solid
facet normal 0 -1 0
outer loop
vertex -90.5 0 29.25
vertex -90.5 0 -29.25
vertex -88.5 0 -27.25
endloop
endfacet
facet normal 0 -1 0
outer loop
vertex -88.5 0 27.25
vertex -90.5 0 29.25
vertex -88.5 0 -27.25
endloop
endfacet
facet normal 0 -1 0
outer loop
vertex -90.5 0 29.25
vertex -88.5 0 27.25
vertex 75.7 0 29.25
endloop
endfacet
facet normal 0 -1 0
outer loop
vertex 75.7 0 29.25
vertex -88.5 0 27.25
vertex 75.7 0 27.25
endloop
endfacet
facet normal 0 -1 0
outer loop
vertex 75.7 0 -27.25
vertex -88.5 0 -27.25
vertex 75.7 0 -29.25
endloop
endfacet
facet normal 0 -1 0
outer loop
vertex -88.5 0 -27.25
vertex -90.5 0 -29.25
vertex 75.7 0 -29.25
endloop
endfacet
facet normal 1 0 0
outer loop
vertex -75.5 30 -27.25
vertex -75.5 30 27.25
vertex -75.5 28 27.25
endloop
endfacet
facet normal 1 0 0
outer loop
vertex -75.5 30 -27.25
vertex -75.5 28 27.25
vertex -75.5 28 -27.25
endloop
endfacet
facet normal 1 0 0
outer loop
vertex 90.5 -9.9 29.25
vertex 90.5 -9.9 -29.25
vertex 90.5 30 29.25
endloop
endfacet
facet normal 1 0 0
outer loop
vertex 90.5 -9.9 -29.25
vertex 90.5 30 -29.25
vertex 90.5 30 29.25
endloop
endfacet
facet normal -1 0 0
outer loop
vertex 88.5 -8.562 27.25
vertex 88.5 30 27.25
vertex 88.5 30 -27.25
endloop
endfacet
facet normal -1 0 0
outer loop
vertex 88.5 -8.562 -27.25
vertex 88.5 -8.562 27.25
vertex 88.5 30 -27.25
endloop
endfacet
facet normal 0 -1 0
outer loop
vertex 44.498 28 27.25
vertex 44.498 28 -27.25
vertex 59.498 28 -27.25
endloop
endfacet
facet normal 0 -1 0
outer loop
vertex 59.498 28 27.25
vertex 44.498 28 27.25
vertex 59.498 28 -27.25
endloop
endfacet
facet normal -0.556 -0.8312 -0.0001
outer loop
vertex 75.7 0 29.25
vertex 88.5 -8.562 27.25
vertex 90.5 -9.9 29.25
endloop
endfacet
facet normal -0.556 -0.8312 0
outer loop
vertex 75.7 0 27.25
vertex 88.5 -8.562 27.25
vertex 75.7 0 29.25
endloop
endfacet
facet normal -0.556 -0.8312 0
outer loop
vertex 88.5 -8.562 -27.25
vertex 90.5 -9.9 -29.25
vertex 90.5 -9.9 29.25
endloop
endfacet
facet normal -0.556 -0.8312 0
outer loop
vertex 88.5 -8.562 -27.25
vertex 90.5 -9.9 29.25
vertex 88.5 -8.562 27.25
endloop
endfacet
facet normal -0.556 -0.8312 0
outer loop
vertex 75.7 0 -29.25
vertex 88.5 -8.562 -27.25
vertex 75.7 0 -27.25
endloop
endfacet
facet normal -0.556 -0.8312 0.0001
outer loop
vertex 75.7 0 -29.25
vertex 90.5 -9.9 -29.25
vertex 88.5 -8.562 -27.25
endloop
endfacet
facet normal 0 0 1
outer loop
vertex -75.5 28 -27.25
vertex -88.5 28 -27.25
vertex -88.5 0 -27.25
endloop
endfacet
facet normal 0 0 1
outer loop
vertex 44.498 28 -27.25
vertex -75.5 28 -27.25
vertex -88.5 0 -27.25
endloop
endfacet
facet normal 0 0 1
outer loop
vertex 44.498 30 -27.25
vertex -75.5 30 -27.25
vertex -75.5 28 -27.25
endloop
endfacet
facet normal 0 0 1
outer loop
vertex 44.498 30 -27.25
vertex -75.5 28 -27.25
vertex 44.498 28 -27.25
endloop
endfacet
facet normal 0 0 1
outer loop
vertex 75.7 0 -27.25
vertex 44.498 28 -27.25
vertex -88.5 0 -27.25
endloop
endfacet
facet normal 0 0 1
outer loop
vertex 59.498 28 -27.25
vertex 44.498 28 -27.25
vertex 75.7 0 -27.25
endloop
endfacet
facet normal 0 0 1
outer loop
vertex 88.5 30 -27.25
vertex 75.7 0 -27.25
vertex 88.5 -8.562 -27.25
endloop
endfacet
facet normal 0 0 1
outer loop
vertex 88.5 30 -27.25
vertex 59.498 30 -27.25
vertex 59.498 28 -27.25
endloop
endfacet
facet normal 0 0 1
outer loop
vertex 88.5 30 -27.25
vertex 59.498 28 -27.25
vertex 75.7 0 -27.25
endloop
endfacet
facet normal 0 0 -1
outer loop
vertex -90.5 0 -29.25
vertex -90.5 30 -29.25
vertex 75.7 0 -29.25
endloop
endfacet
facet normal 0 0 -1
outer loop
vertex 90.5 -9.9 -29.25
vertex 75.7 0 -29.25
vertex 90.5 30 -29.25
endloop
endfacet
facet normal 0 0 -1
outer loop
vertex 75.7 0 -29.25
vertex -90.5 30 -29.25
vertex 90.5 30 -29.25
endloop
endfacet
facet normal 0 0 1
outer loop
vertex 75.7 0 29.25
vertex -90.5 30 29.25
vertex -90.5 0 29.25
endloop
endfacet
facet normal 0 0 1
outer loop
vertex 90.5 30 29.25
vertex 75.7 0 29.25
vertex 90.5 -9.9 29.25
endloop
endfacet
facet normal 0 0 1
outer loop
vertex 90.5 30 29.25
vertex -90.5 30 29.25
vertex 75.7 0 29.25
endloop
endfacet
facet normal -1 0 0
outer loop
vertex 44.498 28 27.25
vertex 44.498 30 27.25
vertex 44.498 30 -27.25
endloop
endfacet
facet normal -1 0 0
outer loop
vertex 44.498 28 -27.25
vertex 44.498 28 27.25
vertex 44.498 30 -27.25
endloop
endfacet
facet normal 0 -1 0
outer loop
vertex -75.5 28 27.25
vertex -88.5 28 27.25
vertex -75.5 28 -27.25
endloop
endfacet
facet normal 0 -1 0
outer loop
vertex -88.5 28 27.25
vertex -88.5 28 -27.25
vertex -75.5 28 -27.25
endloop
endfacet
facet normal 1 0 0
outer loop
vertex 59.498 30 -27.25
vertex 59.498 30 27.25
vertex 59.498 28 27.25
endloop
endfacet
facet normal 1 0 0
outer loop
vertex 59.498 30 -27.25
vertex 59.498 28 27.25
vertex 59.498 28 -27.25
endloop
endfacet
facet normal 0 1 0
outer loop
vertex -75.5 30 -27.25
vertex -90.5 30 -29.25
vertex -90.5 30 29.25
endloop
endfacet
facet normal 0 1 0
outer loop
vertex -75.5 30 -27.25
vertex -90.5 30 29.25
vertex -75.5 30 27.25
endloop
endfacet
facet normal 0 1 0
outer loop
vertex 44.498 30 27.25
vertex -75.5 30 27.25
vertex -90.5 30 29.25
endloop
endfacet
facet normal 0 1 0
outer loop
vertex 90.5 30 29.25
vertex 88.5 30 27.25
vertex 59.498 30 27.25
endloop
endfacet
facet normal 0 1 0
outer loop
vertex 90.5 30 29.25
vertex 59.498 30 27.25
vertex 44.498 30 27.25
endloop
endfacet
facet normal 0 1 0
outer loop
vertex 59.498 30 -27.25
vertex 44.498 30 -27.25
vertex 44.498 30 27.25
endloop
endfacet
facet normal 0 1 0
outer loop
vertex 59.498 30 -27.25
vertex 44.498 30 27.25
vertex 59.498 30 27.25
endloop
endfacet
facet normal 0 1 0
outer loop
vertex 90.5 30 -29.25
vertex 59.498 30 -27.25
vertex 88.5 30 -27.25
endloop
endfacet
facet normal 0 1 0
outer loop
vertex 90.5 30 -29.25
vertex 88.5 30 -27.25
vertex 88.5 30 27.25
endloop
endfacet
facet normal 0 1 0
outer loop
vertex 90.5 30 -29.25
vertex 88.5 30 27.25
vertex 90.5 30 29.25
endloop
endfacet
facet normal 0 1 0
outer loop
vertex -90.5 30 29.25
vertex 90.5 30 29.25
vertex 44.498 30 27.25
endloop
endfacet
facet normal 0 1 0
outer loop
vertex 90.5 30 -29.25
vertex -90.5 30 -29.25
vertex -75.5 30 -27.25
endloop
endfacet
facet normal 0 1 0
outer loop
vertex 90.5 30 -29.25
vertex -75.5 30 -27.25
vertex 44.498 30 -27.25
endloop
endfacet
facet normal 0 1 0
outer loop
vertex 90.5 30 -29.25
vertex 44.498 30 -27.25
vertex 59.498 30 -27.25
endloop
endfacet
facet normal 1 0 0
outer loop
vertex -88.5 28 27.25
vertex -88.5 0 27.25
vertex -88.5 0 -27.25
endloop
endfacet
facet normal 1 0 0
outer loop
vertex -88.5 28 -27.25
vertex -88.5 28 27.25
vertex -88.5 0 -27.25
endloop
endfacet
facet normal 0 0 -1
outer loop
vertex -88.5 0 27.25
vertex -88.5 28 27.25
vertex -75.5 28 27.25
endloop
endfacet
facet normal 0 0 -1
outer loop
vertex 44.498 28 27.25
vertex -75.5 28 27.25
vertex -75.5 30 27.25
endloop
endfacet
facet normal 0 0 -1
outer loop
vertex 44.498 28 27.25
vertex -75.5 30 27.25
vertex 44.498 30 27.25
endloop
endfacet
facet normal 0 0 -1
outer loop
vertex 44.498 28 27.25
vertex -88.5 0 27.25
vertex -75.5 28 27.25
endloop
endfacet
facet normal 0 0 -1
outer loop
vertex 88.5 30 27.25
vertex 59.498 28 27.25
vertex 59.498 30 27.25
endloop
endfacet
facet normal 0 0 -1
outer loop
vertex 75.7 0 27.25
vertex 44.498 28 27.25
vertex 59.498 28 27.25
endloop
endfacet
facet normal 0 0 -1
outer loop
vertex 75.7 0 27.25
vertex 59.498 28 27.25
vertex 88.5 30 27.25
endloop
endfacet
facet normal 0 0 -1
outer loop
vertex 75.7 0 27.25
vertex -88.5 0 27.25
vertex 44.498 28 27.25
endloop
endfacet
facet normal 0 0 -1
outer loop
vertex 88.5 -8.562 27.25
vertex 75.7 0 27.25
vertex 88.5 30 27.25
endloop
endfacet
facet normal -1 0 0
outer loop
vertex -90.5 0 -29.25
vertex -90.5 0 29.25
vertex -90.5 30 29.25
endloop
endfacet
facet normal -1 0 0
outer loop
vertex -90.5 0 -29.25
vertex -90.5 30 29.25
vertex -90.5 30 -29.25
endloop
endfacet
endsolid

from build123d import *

# Parameters (mm, degrees)
SKETCH_2_W          = 181
SKETCH_2_H          = 58.5
SKETCH_2_W_2        = 177
SKETCH_2_H_2        = 54.5
EXTRUDE_1_DEPTH     = 30
SKETCH_3_W          = 14.8
SKETCH_3_H          = 58.5
EXTRUDE_2_DEPTH     = 9.9
SKETCH_5_W          = 12.8
SKETCH_5_H          = 54.5
CUT_EXTRUDE_1_DEPTH = 9.9
CUT_EXTRUDE_2_DEPTH = 1000
SKETCH_7_W          = 15
SKETCH_7_H          = 58.5
EXTRUDE_3_DEPTH     = 2


with BuildPart() as part:
    # Эскиз2 → Бобышка-Вытянуть1 (new body)
    with BuildSketch(Plane(origin=(0, 0, 0), x_dir=(1, 0, 0), z_dir=(0, 1, 0))):
        Rectangle(SKETCH_2_W, SKETCH_2_H)
        Rectangle(SKETCH_2_W_2, SKETCH_2_H_2, mode=Mode.SUBTRACT)
    extrude(amount=EXTRUDE_1_DEPTH)

    # Эскиз3 → Бобышка-Вытянуть2 (add)
    with BuildSketch(Plane.XZ):
        with Locations((83.1, 0)):
            Rectangle(SKETCH_3_W, SKETCH_3_H)
    extrude(amount=EXTRUDE_2_DEPTH)

    # Эскиз5 → Вырез-Вытянуть1 (cut)
    with BuildSketch(Plane(origin=(0, 0, 0), x_dir=(1, 0, 0), z_dir=(0, 1, 0))):
        with Locations((82.1, 0)):
            Rectangle(SKETCH_5_W, SKETCH_5_H)
    extrude(amount=-CUT_EXTRUDE_1_DEPTH, mode=Mode.SUBTRACT)

    # Эскиз6 → Вырез-Вытянуть2 (cut)
    with BuildSketch(Plane(origin=(0, 0, -29.25), x_dir=(-1, 0, 0), z_dir=(0, 0, -1))):
        Polygon((-90.5, -9.9), (-75.7, 0), (-75.7, -9.9), align=None)
    extrude(amount=-CUT_EXTRUDE_2_DEPTH, mode=Mode.SUBTRACT)

    # Эскиз7 → Бобышка-Вытянуть3 (add)
    with BuildSketch(Plane(origin=(0, 30, 0), x_dir=(1, 0, 0), z_dir=(0, 1, 0))):
        with Locations((-83, 0)):
            Rectangle(SKETCH_7_W, SKETCH_7_H)
        with Locations((51.997710559, 0)):
            Rectangle(SKETCH_7_W, SKETCH_7_H)
    extrude(amount=-EXTRUDE_3_DEPTH)


solid = part.part
